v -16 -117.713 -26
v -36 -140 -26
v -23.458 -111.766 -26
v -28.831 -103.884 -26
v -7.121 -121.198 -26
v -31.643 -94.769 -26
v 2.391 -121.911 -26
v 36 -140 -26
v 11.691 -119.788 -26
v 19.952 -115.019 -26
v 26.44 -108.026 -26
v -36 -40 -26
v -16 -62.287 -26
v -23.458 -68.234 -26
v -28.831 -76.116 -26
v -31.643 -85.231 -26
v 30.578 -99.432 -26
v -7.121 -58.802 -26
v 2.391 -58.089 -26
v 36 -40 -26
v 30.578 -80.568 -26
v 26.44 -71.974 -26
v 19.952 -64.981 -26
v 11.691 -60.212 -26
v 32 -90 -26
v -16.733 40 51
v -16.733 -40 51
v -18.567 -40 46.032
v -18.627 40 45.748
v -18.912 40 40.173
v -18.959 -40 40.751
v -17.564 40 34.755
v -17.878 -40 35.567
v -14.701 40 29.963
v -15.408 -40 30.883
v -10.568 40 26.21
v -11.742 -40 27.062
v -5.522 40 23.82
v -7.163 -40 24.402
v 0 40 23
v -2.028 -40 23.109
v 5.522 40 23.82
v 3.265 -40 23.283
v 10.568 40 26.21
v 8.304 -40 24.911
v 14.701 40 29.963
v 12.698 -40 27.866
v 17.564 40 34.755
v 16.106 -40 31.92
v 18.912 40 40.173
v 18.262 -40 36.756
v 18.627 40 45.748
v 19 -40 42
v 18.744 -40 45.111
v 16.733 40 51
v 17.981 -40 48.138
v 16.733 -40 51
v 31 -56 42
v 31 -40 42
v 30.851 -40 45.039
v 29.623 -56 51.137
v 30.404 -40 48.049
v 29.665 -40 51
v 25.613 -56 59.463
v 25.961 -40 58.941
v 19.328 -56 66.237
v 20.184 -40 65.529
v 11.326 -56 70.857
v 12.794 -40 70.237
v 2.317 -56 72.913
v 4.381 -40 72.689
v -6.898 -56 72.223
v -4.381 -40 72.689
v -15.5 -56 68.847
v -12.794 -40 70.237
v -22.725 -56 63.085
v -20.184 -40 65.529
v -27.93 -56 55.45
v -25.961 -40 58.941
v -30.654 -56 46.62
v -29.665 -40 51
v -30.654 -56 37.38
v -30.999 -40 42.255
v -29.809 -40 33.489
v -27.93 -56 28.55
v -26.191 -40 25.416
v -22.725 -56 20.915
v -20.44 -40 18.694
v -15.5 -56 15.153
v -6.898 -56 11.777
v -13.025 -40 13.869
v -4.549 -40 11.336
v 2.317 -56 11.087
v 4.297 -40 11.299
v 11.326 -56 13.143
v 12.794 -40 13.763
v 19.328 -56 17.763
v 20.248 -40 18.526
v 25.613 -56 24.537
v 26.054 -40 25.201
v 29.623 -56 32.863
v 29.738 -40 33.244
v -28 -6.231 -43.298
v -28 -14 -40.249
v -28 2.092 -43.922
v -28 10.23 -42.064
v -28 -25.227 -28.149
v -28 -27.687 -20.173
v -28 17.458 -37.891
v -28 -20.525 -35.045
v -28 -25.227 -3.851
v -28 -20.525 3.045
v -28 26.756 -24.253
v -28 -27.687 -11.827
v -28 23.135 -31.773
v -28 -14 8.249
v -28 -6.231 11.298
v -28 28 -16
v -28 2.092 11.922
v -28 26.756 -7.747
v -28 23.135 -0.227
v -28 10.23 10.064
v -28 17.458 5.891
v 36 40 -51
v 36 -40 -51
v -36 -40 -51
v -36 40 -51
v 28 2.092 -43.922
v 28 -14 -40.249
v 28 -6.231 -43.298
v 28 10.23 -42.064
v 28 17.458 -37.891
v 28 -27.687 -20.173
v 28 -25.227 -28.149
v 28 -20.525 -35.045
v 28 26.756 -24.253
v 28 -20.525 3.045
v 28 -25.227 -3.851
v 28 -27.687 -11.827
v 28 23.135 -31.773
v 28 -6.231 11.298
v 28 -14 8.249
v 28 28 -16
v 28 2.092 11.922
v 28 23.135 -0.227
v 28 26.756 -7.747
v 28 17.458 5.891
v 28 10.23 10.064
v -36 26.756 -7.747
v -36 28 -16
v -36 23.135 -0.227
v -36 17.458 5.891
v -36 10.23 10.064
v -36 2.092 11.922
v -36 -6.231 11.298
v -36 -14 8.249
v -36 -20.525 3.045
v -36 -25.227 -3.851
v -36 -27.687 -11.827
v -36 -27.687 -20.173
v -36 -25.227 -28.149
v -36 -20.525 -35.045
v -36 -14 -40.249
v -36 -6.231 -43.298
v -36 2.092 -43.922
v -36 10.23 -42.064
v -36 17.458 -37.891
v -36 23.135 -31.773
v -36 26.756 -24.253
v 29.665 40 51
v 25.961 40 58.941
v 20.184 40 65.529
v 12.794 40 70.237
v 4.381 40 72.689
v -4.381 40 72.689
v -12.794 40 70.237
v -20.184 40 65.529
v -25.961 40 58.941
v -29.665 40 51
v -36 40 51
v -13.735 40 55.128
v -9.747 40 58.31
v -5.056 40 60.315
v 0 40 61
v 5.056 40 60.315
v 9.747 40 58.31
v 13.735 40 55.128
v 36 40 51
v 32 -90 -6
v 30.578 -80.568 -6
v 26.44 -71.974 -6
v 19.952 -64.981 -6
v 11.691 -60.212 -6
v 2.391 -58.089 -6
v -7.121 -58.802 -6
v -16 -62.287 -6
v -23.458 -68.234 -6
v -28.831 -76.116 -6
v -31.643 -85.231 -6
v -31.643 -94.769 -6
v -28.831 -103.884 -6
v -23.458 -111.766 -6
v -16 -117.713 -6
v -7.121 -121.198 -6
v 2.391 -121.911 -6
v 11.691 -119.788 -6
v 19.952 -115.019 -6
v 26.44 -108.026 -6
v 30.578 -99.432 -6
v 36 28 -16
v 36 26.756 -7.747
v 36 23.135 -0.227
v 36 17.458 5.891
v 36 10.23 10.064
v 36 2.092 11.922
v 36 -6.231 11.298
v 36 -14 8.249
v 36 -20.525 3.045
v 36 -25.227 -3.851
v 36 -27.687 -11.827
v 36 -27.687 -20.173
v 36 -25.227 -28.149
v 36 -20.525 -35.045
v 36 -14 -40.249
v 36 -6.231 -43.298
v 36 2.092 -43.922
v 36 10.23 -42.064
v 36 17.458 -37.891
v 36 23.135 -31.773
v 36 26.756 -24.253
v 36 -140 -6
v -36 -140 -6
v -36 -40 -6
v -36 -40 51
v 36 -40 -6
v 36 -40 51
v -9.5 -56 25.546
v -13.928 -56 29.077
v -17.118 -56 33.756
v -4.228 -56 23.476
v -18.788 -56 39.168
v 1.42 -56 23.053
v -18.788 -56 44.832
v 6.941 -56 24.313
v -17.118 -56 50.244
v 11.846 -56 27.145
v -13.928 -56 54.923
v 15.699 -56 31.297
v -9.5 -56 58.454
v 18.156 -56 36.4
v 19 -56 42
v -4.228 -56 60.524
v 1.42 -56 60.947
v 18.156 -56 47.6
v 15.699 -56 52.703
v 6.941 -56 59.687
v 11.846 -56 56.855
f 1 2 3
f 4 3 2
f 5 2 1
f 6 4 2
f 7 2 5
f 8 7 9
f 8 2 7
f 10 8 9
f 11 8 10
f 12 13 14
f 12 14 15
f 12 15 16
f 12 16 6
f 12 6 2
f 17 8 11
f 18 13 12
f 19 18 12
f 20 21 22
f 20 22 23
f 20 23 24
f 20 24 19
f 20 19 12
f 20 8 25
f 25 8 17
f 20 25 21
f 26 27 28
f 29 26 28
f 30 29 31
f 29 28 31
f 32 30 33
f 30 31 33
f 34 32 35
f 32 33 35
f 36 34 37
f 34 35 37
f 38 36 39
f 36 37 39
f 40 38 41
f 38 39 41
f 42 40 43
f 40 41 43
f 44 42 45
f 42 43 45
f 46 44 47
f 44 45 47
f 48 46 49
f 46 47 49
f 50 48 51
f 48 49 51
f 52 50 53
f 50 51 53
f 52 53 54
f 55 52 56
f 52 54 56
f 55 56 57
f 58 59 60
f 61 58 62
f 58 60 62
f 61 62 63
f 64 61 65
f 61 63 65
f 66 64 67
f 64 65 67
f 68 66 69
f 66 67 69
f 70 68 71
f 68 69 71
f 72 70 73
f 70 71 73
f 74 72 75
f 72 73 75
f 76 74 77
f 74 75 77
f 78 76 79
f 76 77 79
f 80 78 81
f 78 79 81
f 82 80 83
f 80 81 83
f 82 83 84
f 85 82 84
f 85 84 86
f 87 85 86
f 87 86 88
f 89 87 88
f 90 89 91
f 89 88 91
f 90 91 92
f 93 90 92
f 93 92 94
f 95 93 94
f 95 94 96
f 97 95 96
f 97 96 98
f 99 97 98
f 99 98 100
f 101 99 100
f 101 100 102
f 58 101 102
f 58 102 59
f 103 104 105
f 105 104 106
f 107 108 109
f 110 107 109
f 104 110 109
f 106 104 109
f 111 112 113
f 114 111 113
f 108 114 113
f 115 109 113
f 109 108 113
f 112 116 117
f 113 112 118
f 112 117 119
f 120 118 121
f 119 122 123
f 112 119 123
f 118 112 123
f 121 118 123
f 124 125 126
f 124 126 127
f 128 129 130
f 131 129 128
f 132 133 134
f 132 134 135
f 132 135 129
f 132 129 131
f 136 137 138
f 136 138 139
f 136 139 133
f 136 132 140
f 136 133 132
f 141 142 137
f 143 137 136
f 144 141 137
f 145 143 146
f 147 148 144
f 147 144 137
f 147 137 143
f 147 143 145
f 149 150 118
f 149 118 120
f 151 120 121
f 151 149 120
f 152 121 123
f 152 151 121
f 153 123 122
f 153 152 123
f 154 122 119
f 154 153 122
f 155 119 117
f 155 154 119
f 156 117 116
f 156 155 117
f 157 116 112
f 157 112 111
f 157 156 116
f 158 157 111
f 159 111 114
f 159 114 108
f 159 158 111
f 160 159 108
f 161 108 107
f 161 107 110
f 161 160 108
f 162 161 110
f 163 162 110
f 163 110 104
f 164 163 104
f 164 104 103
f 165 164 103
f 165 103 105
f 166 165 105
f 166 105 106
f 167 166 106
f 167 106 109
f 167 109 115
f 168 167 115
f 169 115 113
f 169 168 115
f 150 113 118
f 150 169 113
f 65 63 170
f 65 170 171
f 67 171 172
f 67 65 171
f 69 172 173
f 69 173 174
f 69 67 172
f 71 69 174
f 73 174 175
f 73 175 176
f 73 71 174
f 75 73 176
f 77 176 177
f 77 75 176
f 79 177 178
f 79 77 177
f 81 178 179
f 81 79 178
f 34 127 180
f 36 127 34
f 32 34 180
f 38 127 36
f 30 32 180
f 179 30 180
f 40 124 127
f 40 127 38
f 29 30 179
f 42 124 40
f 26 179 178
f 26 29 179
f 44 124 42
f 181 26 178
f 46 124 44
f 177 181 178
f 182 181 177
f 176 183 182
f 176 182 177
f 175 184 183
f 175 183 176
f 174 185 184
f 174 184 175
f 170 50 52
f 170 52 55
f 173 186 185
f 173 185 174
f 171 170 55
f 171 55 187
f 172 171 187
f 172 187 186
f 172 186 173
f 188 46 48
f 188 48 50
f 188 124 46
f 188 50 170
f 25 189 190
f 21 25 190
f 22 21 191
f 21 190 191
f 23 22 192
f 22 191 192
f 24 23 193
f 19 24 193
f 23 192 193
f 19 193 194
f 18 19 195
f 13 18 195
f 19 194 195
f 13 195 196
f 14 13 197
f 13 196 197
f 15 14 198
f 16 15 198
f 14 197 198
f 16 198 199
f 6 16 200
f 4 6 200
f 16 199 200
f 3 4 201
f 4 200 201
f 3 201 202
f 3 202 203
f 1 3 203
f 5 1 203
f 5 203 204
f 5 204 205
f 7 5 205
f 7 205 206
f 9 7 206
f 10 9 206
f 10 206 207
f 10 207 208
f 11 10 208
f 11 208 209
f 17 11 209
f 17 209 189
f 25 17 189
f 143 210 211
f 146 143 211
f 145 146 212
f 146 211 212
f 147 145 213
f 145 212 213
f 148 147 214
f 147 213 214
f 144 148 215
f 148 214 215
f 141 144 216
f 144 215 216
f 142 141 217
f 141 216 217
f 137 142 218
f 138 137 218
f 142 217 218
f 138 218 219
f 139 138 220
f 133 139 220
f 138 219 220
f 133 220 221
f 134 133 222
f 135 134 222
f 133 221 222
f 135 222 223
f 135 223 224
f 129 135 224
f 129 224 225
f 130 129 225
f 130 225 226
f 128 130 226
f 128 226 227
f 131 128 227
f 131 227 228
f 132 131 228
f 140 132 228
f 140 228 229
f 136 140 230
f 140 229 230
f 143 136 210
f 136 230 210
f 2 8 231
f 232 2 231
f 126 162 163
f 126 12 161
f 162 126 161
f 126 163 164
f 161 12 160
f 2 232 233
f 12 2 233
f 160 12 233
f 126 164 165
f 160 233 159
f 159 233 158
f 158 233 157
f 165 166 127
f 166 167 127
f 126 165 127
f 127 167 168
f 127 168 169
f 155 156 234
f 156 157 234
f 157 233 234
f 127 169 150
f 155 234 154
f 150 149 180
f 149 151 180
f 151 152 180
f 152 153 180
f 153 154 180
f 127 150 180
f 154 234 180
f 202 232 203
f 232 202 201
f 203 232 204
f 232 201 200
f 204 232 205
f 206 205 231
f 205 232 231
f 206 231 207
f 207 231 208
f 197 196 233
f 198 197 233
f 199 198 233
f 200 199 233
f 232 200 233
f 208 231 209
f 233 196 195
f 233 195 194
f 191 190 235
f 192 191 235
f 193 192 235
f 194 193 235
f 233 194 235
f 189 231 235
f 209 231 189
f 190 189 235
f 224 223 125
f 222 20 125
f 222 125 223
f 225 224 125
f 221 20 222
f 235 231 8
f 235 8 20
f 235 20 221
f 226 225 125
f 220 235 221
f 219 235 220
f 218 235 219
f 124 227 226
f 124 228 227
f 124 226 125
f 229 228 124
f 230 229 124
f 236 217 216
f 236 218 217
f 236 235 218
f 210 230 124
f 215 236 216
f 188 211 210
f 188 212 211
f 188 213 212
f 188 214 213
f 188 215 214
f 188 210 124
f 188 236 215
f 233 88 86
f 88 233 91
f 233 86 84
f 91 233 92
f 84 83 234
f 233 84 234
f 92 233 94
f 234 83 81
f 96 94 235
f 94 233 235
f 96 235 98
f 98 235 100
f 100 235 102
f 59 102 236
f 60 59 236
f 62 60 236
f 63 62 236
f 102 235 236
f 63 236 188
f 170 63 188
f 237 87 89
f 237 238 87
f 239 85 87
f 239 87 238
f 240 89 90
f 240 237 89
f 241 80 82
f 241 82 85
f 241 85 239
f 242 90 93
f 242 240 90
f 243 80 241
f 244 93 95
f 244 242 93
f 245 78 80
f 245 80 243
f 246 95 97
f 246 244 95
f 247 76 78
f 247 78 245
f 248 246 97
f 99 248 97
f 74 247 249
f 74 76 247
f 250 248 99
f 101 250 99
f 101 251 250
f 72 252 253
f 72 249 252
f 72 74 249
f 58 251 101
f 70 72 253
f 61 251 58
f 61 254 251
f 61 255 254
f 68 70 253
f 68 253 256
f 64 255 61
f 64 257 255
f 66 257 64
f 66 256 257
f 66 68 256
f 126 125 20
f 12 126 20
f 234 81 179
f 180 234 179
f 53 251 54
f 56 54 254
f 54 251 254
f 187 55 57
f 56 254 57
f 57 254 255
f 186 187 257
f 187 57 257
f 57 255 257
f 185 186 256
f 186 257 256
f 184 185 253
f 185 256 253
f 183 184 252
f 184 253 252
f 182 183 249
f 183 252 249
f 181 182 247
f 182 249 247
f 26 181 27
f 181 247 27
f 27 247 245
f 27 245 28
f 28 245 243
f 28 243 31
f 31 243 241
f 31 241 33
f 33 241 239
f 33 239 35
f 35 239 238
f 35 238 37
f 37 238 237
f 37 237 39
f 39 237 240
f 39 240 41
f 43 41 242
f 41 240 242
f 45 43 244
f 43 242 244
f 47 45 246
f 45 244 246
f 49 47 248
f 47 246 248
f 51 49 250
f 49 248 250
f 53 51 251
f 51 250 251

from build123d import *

# Parameters (mm, degrees)
F0_W          = 80
F0_H          = 102
F1_DEPTH      = 36
F2_W          = 100
F2_H          = 20
F3_DEPTH      = 72
F4_R          = 28
F5_DEPTH      = 8
F6_R          = 31
F6_R_2        = 19
F7_DEPTH      = 16
F7_DEPTH_BACK = 80
F8_DEPTH      = 80.001
F9_R          = 32
F10_DEPTH     = 45.001


# Not quite as in the source:
# - a pattern or mirror of a feature is missing from the dataset's text; its kind, count and spacing are read off the source's solid


with BuildPart() as f1:
    # F0 (on Right) → F1 (new body, symmetric)
    with BuildSketch(Plane.YZ):
        Rectangle(F0_W, F0_H)
    extrude(amount=F1_DEPTH, both=True)

    # F2 (on face) → F3 (join, through all)
    with BuildSketch(Plane.YZ.offset(36)):
        with Locations((-90, -16)):
            Rectangle(F2_W, F2_H)
    extrude(amount=-F3_DEPTH)

    # F4 (on face) → F5 (cut)
    with BuildSketch(Plane.YZ.offset(36)):
        with Locations((0, -16)):
            Circle(F4_R)
    f5 = extrude(amount=-F5_DEPTH, mode=Mode.SUBTRACT)

    # F5_copies: F5 across plane
    add(f5.mirror(Plane(origin=(0, 0, 0), x_dir=(0, 0, -1), z_dir=(-1, 0, 0))), mode=Mode.SUBTRACT)

    # F6 (on face) → F7 (join, two sides)
    with BuildSketch(Plane.XZ.offset(40)) as f7_sk:
        with Locations((0, 42)):
            Circle(F6_R)
        with Locations((0, 42)):
            Circle(F6_R_2, mode=Mode.SUBTRACT)
    extrude(amount=F7_DEPTH)
    extrude(f7_sk.sketch, amount=-F7_DEPTH_BACK)

    # F8 (cut, through all): a face of the model
    f8_faces = [f1.faces().sort_by_distance(p)[0] for p in [
        (0, -40, 38.5131332961),
    ]]
    extrude(f8_faces, amount=-F8_DEPTH, mode=Mode.SUBTRACT)

    # F9 (on face) → F10 (cut, through all)
    with BuildSketch(Plane.XY.offset(-6)):
        with Locations((0, -90)):
            Circle(F9_R)
    extrude(amount=-F10_DEPTH, mode=Mode.SUBTRACT)


solid = f1.part
